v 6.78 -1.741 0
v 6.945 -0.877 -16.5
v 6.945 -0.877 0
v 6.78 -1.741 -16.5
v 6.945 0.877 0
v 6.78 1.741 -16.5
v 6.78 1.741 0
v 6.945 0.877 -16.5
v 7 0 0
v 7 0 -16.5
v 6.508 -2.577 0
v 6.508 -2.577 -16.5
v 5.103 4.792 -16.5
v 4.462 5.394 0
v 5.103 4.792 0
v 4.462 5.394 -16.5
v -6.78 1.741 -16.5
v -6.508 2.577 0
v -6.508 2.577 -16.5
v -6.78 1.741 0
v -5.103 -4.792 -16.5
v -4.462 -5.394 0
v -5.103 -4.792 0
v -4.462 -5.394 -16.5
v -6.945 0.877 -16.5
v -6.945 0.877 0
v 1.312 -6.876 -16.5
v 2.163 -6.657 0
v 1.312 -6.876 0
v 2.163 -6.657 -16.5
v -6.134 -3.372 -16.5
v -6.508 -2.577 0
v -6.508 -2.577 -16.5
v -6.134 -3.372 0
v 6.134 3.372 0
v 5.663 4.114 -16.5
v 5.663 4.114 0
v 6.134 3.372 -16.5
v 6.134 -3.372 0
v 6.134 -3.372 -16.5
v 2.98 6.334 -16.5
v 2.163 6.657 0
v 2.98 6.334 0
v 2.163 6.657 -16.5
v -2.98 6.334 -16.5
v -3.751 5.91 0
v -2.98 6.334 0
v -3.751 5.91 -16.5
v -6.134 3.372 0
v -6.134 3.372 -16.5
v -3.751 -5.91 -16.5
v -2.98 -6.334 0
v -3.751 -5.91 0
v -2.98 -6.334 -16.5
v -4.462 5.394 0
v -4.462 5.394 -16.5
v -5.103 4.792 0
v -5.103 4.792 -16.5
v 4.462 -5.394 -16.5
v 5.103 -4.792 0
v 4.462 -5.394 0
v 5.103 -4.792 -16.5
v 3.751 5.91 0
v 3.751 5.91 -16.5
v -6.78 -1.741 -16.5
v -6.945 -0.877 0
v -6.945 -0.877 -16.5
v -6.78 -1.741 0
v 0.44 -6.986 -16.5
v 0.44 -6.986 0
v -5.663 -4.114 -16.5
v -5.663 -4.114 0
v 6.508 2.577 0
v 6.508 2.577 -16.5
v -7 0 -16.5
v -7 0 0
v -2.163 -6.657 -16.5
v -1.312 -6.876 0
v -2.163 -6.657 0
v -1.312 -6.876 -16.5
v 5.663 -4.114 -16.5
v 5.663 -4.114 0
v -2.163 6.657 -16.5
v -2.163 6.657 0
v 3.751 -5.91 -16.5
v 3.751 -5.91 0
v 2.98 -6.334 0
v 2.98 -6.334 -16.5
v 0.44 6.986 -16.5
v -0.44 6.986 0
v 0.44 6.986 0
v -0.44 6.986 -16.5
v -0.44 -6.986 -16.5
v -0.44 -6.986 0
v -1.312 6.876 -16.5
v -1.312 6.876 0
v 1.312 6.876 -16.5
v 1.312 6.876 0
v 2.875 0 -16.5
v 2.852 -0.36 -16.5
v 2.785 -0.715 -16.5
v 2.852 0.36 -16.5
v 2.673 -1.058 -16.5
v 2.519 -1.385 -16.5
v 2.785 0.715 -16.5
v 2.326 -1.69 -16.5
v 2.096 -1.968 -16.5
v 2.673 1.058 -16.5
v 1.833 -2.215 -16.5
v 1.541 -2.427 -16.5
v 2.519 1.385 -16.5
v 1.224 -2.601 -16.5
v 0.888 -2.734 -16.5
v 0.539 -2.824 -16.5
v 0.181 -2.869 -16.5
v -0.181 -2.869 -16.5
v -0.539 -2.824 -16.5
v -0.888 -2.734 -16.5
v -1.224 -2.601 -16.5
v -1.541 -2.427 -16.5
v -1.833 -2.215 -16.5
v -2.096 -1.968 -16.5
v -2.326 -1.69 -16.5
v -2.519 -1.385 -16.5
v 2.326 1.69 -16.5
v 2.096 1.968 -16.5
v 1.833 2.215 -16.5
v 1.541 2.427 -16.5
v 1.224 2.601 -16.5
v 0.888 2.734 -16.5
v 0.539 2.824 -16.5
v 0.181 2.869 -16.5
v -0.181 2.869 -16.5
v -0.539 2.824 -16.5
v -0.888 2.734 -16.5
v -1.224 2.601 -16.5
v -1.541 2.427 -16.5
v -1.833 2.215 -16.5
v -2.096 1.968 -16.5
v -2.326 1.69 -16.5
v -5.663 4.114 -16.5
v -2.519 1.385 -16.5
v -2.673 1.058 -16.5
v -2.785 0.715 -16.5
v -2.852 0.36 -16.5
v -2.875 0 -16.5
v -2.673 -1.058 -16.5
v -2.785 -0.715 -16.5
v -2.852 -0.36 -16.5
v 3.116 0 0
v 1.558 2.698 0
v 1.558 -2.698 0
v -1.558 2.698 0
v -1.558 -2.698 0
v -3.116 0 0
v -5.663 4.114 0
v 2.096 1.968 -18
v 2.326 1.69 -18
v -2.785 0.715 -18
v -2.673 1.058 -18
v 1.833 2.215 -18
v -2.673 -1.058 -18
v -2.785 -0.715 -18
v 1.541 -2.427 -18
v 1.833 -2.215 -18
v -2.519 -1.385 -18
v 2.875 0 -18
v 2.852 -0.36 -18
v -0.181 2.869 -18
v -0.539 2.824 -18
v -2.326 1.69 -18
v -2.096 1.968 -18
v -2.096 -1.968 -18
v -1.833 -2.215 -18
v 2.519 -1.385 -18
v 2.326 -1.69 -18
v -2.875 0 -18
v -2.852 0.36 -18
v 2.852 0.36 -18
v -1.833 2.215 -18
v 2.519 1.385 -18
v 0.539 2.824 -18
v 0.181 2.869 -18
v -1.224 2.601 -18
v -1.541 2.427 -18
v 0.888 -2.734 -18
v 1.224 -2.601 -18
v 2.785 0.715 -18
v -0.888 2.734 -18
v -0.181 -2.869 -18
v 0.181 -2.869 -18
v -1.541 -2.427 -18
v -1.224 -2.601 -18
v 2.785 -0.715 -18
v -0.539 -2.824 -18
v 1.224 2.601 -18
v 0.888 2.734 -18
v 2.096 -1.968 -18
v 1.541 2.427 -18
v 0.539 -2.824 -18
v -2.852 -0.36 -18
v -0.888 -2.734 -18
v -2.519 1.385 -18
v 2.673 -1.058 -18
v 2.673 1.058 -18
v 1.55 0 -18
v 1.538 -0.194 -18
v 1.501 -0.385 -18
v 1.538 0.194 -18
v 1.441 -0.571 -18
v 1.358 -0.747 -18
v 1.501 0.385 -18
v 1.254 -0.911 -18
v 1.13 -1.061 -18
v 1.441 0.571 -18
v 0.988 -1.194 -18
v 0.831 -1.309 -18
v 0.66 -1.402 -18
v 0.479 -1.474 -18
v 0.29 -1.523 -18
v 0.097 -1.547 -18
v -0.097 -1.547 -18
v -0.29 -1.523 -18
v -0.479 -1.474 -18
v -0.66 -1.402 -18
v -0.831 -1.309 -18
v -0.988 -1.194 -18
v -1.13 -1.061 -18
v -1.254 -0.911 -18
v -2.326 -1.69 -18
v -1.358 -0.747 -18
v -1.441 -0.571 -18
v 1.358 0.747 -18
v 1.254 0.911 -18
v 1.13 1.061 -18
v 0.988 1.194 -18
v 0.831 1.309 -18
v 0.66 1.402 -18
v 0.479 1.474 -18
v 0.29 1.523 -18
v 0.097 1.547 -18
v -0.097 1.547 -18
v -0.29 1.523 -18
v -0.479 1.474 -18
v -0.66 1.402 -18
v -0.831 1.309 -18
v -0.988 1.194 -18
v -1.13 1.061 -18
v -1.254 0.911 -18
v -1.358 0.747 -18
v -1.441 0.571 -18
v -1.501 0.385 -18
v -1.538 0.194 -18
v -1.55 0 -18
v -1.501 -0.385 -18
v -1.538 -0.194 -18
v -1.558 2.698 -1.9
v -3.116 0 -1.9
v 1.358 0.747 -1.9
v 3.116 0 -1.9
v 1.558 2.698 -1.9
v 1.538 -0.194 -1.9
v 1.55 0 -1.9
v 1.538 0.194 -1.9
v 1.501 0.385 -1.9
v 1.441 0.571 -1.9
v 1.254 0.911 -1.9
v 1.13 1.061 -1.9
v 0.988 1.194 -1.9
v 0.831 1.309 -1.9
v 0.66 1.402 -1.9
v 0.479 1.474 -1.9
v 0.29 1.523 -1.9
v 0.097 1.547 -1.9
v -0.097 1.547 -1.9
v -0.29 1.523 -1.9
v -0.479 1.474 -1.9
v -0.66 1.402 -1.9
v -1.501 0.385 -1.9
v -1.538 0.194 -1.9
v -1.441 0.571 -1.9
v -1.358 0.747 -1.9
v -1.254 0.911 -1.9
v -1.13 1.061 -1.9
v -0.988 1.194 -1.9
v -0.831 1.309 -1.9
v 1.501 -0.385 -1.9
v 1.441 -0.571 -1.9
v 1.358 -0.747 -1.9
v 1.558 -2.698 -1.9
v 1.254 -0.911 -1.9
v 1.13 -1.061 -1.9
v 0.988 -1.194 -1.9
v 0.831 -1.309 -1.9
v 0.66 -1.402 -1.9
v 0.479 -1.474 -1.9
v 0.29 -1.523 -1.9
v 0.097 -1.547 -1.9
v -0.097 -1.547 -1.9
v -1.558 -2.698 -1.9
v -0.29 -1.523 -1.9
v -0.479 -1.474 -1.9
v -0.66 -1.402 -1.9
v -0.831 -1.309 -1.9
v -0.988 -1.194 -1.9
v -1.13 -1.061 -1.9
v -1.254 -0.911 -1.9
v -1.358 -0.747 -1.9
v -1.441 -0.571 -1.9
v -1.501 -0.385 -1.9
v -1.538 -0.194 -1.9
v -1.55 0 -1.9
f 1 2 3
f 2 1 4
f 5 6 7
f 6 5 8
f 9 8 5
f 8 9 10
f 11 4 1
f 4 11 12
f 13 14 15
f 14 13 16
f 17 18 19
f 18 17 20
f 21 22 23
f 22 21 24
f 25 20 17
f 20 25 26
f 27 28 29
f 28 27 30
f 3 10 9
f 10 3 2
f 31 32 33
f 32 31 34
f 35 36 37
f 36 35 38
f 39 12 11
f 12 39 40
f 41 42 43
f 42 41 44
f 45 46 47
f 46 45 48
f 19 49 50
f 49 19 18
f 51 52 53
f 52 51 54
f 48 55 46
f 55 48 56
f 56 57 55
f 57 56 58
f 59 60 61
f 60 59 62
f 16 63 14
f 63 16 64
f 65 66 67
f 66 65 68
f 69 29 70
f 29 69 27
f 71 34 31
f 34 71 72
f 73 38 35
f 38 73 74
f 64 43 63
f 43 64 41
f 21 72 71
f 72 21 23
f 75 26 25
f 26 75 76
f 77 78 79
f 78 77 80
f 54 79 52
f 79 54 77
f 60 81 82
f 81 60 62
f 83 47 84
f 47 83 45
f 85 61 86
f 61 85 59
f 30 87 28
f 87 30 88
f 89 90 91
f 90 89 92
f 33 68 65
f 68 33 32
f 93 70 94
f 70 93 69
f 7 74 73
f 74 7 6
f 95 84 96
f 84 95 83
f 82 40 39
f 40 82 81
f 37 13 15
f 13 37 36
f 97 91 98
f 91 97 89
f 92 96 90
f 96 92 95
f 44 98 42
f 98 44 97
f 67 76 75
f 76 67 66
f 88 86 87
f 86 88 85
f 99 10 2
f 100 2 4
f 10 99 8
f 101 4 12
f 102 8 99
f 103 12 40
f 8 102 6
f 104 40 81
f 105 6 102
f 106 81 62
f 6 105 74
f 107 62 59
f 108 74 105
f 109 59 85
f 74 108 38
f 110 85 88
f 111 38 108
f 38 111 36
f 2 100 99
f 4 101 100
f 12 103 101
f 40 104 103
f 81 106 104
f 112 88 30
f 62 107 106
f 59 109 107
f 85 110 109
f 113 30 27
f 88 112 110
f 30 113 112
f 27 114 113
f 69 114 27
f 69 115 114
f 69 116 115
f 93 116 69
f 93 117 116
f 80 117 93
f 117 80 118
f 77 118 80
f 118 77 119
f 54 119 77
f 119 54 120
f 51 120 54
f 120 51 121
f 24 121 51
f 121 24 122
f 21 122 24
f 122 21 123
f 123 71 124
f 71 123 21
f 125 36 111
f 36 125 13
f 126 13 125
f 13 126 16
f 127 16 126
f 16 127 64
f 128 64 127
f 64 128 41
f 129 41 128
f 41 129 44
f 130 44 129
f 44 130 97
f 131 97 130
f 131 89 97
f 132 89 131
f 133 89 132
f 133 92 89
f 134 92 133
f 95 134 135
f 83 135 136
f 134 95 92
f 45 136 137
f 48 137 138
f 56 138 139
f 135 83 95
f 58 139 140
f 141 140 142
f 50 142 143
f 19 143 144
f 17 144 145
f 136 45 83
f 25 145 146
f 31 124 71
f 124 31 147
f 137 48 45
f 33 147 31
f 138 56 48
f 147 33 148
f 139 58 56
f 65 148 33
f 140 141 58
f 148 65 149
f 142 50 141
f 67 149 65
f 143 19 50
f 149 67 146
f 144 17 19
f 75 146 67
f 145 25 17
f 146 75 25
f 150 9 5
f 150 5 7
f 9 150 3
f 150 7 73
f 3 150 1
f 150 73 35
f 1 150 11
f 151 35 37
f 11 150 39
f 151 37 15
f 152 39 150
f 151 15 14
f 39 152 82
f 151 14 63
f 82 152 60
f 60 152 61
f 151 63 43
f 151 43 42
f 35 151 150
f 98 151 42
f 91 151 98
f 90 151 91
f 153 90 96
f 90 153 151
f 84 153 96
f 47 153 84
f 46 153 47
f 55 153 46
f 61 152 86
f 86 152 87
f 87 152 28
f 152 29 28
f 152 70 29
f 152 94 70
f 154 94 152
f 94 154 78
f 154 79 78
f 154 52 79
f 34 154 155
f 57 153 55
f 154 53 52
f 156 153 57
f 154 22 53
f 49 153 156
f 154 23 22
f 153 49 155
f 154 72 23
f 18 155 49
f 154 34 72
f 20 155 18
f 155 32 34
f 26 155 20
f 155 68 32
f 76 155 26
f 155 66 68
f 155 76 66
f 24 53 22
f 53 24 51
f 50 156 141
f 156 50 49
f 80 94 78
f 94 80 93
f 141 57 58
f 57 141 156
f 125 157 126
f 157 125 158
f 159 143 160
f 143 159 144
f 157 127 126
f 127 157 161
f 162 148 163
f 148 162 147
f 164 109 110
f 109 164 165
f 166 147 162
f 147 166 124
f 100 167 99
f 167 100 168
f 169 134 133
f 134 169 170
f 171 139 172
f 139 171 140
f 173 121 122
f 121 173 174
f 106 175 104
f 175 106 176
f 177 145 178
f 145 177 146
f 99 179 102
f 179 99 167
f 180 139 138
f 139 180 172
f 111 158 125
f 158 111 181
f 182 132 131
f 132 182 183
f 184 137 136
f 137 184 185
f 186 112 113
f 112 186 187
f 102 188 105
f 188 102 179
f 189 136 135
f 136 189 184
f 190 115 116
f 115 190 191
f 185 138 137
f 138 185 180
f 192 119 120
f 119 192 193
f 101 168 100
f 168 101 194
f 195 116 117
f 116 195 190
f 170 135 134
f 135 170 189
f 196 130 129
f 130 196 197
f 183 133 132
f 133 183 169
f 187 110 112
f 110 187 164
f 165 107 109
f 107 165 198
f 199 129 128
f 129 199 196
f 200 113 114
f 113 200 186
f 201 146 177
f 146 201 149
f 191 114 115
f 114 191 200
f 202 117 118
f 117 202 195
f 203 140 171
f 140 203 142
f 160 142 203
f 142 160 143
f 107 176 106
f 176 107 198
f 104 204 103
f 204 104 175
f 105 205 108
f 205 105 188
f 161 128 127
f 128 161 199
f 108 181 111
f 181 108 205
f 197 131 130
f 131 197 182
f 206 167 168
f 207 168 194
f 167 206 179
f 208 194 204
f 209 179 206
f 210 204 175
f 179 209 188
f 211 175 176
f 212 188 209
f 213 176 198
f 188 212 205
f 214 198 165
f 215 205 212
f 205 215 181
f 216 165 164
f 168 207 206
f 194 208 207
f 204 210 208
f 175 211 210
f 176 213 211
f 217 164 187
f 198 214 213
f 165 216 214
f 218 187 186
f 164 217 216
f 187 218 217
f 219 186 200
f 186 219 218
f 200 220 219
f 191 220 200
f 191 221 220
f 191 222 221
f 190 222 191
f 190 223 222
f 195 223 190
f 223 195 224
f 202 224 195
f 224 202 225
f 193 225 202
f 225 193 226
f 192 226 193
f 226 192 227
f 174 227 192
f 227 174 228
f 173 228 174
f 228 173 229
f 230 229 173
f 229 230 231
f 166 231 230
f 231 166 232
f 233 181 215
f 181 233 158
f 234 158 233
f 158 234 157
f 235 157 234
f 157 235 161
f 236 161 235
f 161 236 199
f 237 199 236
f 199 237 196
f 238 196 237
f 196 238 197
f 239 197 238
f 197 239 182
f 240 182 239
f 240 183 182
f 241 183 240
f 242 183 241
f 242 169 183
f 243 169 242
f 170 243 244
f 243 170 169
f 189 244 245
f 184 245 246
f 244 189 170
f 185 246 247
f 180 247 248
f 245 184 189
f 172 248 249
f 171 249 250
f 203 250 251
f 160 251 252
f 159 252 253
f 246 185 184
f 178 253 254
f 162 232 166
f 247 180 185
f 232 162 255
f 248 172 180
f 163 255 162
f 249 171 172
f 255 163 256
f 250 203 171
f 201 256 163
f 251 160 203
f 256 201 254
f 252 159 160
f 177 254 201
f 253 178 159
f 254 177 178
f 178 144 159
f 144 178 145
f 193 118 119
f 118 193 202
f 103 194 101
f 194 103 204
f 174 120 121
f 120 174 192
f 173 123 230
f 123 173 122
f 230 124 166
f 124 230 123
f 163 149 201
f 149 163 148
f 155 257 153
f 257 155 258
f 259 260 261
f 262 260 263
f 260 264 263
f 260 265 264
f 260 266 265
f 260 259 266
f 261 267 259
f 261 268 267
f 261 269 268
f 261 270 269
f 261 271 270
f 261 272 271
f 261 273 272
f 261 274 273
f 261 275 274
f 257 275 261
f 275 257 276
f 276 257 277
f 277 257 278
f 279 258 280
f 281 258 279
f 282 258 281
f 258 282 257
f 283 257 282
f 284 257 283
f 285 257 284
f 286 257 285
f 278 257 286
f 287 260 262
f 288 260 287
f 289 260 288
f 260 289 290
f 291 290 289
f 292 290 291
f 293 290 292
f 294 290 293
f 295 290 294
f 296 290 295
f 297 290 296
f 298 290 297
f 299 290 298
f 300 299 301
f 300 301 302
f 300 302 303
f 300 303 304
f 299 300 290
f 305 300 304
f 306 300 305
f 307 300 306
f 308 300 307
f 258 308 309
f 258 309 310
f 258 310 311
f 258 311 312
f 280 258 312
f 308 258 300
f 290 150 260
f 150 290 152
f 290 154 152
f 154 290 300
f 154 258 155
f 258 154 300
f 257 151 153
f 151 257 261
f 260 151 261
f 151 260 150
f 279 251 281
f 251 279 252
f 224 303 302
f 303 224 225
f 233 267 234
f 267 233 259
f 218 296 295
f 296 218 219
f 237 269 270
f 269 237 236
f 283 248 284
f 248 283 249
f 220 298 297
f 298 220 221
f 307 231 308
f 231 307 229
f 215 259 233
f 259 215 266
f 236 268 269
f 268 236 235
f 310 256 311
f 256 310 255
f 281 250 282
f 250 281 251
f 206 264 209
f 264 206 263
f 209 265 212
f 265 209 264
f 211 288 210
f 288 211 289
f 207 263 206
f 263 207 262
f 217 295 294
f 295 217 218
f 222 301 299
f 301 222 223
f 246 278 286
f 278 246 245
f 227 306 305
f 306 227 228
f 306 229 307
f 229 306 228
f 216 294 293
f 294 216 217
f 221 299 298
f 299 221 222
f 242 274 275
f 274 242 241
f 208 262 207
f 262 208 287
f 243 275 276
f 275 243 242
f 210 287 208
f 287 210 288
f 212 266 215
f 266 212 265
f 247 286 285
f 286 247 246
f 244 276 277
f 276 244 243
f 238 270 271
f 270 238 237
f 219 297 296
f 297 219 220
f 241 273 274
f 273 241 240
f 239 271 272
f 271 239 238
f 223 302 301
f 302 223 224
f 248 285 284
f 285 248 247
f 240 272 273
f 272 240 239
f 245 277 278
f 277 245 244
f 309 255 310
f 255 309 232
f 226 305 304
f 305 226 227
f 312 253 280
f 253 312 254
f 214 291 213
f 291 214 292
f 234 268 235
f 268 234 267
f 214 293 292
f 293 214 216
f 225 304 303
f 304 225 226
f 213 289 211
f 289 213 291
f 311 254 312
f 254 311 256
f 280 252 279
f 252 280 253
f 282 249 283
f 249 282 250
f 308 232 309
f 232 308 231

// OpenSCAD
$fn = 50;

difference() {
	union() {
		translate(v = [0, 0, -16.5]) {
			cylinder(h = 16.5, r = 7.0);
		}
		#translate(v = [0, 0, -18.0]) {
			cylinder(h = 18, r = 2.875);
		}
	}
	union() {
		translate(v = [0, 0, 0]) {
			rotate(a = [0, 0, 0]) {
				difference() {
					union() {
						translate(v = [0, 0, -1.9]) {
							linear_extrude(height = 1.9) {
								polygon(points = [[3.1158, 0.0], [1.5579000000000005, 2.698361953111554], [-1.5578999999999994, 2.6983619531115544], [-3.1158, 3.815754496783323e-16], [-1.5579000000000014, -2.6983619531115535], [1.557899999999998, -2.6983619531115552]]);
							}
						}
					}
					union();
				}
			}
		}
		#translate(v = [0, 0, -100.0]) {
			cylinder(h = 200, r = 1.55);
		}
	}
}
